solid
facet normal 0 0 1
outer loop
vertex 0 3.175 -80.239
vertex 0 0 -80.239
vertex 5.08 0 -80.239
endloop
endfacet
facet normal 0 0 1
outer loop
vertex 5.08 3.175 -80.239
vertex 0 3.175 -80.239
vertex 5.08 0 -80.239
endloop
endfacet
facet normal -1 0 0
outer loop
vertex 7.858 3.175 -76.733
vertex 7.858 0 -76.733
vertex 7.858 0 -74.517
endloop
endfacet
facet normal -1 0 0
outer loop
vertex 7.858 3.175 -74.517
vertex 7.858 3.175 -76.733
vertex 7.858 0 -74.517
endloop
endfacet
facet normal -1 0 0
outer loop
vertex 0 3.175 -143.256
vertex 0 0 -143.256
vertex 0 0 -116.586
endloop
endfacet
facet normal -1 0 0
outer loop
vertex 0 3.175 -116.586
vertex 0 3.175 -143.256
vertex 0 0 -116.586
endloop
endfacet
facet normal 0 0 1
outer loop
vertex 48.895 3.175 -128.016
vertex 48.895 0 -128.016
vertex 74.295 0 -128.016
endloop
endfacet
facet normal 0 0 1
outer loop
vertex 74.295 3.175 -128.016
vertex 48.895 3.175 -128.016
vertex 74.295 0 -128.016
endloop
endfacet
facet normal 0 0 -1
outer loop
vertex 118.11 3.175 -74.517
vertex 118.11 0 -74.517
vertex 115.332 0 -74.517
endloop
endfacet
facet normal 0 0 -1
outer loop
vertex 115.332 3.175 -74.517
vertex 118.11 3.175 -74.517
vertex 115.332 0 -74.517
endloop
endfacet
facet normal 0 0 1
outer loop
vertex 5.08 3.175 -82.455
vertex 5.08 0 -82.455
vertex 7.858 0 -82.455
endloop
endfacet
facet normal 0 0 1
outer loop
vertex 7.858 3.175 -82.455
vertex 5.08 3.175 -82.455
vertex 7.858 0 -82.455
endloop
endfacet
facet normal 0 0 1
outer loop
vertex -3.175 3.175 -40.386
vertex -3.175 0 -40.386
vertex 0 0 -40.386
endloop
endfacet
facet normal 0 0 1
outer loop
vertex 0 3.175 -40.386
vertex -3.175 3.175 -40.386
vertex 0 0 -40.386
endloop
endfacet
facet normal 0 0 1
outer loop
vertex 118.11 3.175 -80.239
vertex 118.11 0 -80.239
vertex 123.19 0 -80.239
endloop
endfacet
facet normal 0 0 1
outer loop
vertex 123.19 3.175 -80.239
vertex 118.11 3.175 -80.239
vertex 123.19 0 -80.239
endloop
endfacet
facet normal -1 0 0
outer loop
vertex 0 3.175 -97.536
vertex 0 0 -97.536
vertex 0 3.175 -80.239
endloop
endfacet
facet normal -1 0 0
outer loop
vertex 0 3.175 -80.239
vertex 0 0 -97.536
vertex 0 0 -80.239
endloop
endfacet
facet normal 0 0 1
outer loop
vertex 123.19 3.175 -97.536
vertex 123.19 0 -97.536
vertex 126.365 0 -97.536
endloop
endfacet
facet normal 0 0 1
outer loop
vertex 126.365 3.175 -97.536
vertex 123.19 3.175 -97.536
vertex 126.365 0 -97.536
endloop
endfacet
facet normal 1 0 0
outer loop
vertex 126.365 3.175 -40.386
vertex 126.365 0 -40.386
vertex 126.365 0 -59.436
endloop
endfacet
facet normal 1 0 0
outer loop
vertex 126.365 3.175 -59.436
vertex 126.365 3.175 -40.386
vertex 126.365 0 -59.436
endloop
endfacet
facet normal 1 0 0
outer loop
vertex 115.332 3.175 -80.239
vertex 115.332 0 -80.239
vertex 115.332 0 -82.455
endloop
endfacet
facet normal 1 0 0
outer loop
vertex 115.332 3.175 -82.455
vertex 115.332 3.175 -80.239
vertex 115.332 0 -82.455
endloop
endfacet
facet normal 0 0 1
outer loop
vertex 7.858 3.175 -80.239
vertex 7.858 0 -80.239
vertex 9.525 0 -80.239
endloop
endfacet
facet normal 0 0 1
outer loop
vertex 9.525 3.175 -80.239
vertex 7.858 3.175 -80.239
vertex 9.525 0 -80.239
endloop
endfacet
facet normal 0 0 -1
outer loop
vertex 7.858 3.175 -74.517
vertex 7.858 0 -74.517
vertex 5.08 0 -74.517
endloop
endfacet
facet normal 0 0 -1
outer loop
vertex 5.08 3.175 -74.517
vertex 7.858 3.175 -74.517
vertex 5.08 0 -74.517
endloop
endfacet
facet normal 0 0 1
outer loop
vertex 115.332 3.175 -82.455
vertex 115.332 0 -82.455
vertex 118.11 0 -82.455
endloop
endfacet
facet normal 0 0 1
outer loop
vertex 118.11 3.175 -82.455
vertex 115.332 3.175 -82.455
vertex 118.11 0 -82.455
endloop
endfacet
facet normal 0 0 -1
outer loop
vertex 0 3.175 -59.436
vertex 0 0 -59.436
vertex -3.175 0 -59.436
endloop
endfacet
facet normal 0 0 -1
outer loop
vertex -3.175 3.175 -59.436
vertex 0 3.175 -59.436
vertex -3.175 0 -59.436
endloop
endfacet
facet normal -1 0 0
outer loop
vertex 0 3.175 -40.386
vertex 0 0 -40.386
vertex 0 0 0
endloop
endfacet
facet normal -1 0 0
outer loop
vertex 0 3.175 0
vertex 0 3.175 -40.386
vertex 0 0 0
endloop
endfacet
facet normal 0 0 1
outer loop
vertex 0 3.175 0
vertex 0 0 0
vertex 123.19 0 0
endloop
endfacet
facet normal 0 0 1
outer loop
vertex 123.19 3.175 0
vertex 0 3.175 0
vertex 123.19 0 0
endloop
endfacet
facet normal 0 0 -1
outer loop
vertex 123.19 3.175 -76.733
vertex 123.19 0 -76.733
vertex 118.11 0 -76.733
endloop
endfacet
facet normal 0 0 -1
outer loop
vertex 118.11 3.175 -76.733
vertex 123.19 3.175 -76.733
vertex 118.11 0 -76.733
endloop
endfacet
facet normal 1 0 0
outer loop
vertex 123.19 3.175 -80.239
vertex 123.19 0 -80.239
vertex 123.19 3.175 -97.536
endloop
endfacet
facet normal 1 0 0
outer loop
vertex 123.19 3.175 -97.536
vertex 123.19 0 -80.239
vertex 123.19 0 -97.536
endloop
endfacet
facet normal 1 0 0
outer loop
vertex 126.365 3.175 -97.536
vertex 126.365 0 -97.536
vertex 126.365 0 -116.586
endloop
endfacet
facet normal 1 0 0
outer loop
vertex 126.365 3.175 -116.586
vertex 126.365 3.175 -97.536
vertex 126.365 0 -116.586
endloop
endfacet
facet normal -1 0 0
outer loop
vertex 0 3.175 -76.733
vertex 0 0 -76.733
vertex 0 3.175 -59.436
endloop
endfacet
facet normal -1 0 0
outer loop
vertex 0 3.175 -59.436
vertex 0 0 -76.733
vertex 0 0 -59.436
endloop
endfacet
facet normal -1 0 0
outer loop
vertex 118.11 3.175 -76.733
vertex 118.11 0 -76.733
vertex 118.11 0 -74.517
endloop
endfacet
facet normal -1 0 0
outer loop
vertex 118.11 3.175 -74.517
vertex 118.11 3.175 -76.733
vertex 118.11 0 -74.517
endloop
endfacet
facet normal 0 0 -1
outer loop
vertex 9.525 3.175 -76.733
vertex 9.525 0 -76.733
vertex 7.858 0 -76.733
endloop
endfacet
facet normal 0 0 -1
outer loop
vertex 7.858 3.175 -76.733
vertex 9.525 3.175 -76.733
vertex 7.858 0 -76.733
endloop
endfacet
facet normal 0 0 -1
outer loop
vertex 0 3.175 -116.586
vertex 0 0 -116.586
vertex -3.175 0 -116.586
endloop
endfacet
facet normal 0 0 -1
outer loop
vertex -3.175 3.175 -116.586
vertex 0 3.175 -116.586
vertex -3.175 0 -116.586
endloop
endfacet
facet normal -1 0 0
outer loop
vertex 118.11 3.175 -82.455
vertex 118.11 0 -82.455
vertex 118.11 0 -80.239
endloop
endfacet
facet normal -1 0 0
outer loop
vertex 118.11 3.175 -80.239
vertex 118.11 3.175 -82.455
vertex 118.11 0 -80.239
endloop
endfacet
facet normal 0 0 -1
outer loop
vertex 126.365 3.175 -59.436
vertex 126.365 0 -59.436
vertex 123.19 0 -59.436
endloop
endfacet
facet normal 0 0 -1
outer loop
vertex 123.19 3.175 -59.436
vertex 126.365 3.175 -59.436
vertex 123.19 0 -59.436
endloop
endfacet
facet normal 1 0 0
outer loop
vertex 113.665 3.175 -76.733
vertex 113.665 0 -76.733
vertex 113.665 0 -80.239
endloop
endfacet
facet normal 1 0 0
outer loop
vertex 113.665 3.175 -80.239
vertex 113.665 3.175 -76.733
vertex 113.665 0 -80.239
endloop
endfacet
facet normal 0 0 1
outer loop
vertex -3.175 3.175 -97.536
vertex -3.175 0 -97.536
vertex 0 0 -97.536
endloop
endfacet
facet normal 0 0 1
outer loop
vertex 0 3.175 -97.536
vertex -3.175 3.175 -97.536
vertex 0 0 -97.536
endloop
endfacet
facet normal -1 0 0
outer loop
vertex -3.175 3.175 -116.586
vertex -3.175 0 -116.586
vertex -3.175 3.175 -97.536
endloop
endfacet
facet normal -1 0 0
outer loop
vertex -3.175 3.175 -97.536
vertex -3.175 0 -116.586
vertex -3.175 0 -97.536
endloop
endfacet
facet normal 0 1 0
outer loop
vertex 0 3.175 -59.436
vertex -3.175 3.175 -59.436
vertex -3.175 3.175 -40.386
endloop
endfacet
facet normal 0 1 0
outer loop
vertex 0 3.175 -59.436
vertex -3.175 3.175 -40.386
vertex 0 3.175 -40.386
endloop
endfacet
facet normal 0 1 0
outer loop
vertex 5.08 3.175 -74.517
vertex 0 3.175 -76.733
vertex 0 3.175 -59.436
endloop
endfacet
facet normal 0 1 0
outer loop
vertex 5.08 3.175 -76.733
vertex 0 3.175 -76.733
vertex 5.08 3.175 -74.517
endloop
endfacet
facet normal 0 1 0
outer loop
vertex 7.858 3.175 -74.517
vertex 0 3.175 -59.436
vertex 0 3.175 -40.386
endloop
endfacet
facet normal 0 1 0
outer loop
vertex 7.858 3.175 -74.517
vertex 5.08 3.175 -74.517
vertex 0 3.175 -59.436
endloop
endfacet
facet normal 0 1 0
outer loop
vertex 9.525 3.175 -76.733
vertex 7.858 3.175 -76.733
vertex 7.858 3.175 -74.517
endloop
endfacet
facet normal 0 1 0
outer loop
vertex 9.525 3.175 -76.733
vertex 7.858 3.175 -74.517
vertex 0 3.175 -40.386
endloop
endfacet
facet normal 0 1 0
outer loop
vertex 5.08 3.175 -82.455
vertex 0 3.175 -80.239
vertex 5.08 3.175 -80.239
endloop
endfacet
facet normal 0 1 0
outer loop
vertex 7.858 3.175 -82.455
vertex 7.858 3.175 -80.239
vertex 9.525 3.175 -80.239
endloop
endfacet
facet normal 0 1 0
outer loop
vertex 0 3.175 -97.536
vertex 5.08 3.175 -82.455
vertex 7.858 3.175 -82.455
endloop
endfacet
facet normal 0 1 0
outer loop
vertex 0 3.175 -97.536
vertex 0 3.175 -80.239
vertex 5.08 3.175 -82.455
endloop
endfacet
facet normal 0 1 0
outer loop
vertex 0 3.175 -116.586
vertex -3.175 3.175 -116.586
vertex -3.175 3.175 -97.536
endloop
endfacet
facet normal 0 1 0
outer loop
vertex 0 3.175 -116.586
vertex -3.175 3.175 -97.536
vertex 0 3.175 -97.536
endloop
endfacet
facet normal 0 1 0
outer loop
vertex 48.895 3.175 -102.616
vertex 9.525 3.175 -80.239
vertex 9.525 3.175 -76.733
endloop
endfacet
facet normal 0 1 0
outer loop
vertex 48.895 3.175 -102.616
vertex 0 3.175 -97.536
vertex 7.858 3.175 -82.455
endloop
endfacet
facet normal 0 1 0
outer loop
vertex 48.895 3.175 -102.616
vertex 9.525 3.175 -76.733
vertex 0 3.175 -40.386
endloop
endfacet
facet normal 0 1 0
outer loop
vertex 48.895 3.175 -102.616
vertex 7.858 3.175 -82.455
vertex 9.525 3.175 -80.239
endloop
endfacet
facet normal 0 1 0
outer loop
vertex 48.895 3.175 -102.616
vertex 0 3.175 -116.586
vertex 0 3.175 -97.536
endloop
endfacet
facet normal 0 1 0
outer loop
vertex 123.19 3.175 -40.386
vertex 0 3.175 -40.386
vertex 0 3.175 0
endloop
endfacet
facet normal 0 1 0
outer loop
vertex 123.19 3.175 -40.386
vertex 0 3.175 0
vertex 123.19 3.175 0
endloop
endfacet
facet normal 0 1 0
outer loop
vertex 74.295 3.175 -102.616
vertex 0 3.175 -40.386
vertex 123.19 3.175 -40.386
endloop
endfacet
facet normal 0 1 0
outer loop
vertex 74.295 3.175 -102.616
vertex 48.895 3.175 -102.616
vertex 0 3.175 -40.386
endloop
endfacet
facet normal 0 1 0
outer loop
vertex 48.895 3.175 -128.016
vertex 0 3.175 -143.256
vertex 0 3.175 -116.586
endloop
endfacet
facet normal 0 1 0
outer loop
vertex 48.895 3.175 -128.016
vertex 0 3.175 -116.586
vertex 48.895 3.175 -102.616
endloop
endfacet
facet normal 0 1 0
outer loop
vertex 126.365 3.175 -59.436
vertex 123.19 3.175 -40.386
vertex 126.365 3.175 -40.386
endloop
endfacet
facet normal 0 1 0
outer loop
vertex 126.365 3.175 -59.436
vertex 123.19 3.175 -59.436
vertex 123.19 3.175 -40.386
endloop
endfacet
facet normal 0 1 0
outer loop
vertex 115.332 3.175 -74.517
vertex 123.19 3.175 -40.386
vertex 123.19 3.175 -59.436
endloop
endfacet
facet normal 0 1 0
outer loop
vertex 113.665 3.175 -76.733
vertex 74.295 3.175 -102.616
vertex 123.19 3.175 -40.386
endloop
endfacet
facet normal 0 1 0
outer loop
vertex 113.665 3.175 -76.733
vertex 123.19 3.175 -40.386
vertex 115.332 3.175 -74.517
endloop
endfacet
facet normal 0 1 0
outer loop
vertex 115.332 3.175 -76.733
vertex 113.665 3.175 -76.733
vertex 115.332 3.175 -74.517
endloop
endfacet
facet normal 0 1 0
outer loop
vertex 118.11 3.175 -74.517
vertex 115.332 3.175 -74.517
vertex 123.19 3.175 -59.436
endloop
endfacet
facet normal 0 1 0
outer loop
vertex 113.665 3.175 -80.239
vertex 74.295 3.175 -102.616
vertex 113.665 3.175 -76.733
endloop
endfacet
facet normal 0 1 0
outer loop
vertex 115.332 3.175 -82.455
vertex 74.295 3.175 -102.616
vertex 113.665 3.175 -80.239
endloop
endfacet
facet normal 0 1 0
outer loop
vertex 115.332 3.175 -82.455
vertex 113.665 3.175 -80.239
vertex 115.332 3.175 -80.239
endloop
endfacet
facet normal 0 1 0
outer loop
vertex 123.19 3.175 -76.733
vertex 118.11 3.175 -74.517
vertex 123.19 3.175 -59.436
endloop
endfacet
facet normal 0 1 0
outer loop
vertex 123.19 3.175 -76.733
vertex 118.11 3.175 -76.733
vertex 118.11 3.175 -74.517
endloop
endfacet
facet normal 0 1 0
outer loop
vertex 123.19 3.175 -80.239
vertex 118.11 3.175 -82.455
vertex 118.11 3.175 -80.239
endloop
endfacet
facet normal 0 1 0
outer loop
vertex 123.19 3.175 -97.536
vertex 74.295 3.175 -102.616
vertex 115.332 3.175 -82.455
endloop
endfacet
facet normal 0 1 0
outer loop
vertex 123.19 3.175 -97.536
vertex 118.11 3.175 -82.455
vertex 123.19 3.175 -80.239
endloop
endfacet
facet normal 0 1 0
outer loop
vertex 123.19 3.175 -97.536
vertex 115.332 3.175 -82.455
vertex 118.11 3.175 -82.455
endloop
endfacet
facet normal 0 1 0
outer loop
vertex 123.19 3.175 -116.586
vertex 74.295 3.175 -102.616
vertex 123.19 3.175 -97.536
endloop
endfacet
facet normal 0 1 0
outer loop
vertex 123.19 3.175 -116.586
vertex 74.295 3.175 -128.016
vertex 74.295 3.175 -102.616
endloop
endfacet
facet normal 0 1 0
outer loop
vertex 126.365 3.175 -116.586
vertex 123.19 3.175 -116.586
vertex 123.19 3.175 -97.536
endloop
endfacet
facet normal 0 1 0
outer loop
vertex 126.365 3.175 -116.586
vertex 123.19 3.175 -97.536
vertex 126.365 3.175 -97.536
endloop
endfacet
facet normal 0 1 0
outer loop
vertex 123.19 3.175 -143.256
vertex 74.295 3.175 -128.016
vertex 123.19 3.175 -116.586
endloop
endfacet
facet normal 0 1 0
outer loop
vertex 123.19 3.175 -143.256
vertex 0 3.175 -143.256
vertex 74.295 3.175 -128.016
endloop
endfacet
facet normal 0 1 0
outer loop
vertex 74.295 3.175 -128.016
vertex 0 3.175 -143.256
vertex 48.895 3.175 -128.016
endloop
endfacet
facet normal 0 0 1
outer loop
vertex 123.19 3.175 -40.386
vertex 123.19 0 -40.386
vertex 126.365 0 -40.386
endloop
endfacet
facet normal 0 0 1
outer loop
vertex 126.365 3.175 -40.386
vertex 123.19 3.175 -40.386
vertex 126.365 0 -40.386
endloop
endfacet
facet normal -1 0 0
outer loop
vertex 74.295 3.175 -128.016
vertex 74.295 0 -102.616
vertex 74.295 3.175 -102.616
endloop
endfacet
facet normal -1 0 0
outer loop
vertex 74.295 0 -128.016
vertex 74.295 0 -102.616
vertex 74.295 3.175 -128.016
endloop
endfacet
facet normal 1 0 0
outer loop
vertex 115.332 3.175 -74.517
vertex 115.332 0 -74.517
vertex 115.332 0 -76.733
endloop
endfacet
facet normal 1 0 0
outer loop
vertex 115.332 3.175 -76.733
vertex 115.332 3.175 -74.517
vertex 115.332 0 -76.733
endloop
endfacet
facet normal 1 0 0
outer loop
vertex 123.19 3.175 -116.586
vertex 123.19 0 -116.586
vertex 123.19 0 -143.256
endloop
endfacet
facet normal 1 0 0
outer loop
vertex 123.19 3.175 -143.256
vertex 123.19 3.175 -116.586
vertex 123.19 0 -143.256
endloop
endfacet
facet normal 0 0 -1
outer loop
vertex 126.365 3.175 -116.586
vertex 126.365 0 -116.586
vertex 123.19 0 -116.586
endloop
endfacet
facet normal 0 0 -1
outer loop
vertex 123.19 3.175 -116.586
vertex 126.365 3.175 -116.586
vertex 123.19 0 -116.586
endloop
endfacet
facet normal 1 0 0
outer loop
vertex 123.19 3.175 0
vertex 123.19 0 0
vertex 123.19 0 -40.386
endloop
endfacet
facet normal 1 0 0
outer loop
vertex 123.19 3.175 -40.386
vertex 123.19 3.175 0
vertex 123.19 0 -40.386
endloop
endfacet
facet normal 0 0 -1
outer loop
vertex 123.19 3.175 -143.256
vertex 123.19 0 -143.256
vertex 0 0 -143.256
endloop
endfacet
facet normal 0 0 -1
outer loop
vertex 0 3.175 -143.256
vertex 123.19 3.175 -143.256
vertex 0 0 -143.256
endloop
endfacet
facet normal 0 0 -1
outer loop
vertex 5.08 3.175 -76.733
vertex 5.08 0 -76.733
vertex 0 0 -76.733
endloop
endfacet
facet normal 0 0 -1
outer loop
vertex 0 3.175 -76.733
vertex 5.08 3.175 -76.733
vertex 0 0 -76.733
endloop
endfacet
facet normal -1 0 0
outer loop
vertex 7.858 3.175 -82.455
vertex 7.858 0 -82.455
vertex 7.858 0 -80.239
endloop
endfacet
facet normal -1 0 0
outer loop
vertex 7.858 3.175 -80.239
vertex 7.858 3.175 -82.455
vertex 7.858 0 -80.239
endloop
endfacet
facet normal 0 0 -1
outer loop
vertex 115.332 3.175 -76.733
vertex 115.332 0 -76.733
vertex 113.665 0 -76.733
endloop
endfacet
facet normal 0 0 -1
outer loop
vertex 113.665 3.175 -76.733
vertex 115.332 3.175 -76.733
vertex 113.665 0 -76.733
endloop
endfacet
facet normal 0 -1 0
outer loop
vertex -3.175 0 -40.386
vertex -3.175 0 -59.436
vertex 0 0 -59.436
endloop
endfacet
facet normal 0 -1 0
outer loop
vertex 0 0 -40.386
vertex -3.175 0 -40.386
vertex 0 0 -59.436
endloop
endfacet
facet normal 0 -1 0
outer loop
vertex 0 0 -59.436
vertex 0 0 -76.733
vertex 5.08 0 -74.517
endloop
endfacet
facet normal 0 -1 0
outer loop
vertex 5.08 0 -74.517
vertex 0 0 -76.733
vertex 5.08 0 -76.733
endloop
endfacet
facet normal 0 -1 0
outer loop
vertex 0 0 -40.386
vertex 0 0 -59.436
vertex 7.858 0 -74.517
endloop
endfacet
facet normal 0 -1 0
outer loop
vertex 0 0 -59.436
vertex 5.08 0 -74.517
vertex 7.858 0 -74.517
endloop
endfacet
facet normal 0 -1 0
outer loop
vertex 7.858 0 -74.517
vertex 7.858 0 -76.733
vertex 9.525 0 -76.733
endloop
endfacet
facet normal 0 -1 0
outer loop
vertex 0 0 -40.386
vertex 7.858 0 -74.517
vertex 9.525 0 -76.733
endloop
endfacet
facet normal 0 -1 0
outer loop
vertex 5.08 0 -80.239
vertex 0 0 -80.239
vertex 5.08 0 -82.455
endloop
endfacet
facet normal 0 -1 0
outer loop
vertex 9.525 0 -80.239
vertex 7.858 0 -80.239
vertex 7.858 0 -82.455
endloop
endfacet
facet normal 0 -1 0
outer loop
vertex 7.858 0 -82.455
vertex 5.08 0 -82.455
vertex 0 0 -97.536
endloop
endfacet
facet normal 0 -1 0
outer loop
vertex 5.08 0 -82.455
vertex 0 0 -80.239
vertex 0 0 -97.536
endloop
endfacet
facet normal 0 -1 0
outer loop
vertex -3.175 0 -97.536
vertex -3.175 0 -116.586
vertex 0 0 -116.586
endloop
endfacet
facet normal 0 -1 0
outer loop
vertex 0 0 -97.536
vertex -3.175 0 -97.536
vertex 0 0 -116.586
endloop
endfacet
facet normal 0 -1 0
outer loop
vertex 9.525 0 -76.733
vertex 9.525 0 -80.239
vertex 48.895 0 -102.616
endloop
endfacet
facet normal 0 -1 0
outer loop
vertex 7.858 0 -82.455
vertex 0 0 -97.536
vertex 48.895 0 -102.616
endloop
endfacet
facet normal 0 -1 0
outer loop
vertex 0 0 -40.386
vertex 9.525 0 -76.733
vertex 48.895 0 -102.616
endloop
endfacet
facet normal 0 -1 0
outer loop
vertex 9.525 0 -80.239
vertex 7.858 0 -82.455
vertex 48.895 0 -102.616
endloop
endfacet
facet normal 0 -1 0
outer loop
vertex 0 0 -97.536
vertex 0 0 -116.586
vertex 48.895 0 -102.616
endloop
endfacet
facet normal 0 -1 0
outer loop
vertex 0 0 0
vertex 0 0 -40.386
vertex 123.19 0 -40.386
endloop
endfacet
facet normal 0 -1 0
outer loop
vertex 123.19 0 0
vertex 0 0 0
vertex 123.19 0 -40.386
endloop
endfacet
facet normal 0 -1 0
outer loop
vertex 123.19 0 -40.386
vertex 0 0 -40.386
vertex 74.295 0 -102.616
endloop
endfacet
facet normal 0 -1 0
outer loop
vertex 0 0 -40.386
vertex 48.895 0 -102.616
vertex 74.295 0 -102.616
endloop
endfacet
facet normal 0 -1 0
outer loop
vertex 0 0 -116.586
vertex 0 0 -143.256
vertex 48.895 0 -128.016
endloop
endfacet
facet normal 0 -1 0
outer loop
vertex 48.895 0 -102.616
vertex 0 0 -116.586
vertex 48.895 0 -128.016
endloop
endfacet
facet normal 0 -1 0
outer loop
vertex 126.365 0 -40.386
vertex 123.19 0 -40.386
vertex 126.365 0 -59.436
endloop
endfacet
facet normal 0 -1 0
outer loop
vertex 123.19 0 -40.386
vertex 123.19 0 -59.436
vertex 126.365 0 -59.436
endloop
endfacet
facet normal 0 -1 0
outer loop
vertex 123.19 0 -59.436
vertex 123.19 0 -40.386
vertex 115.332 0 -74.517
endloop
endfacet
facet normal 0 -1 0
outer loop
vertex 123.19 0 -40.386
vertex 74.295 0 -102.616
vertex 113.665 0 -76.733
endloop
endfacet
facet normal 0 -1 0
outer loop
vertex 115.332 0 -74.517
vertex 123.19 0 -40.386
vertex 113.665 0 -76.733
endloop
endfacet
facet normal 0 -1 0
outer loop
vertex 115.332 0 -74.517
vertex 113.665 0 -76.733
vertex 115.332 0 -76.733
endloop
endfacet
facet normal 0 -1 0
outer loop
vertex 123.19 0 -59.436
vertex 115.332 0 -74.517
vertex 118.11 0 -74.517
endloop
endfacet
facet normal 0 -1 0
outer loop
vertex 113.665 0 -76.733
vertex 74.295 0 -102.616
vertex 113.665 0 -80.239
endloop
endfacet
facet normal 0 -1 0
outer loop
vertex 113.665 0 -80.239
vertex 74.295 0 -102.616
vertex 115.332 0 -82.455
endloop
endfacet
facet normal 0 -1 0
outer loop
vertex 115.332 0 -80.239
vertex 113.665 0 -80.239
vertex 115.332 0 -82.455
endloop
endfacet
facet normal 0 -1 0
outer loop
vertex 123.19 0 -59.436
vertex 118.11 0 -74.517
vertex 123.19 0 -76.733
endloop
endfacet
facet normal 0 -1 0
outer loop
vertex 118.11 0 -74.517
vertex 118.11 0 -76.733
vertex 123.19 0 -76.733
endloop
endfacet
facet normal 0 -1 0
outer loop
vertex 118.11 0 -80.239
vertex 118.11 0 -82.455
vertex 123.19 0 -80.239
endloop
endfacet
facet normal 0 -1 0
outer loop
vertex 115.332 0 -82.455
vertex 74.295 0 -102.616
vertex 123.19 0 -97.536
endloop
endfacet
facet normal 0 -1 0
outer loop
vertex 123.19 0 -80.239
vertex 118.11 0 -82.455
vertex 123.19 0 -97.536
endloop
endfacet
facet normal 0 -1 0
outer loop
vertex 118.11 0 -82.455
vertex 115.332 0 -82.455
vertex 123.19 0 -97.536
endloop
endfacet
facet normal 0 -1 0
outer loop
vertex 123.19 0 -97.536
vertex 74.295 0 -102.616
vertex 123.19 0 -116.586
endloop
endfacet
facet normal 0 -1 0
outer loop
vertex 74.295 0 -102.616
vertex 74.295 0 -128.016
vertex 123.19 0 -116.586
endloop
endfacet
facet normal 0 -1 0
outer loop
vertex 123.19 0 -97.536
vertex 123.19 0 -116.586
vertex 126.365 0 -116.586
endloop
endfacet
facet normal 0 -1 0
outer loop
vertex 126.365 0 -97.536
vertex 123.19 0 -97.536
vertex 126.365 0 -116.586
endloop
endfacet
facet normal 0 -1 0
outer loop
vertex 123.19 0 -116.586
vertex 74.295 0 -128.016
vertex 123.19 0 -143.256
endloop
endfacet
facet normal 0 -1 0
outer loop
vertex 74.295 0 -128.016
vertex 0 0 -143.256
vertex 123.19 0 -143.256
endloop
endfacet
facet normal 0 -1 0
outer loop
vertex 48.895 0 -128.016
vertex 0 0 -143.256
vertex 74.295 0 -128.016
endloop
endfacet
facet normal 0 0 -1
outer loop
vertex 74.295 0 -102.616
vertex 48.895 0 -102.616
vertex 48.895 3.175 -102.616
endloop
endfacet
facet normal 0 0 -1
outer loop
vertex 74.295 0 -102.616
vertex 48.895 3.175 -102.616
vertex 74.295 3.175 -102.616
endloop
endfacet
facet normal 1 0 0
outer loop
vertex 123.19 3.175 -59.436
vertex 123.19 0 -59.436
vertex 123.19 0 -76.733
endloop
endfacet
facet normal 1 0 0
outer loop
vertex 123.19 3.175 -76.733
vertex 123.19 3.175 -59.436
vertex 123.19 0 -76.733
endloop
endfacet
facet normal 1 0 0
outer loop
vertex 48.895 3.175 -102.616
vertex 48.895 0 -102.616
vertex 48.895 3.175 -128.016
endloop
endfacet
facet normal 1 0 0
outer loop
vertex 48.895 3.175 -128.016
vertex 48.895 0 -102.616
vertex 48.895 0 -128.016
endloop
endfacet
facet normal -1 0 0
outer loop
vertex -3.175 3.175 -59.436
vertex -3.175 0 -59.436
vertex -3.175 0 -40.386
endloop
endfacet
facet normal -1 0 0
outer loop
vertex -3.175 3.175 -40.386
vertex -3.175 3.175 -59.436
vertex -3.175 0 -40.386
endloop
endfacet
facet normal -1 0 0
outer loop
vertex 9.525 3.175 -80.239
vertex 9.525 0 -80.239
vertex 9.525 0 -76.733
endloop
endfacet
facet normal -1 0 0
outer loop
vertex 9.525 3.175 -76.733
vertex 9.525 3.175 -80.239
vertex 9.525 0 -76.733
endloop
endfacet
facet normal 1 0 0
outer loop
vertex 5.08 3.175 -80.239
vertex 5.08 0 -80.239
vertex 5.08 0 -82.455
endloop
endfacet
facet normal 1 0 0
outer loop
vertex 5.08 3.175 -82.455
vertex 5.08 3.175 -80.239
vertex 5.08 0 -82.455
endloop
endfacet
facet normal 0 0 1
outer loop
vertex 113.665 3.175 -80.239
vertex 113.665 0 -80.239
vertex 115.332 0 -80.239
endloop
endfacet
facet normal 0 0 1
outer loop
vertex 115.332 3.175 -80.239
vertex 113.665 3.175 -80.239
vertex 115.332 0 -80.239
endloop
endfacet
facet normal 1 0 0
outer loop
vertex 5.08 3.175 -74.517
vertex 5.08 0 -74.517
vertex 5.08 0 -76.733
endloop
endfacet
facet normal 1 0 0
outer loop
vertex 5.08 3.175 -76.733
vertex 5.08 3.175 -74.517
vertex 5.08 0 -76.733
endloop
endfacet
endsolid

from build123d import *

# Parameters (mm, degrees)
SKETCH1_W           = 25.4
SKETCH1_H           = 25.4
BOSS_EXTRUDE1_DEPTH = 3.175


with BuildPart() as part:
    # Sketch1 → Boss-Extrude1 (new body)
    with BuildSketch(Plane(origin=(0, 0, 0), x_dir=(1, 0, 0), z_dir=(0, 1, 0))):
        Polygon((123.19, 116.586), (123.19, 143.256), (0, 143.256), (0, 116.586), (-3.175, 116.586), (-3.175, 97.536), (0, 97.536), (0, 80.2386), (5.08, 80.2386), (5.08, 82.45475), (7.858125, 82.45475), (7.858125, 80.2386), (9.525, 80.2386), (9.525, 76.7334), (7.858125, 76.7334), (7.858125, 74.51725), (5.08, 74.51725), (5.08, 76.7334), (0, 76.7334), (0, 59.436), (-3.175, 59.436), (-3.175, 40.386), (0, 40.386), (0, 0), (123.19, 0), (123.19, 40.386), (126.365, 40.386), (126.365, 59.436), (123.19, 59.436), (123.19, 76.7334), (118.11, 76.7334), (118.11, 74.51725), (115.331875, 74.51725), (115.331875, 76.7334), (113.665, 76.7334), (113.665, 80.2386), (115.331875, 80.2386), (115.331875, 82.45475), (118.11, 82.45475), (118.11, 80.2386), (123.19, 80.2386), (123.19, 97.536), (126.365, 97.536), (126.365, 116.586), align=None)
        with Locations((61.595, 115.316)):
            Rectangle(SKETCH1_W, SKETCH1_H, mode=Mode.SUBTRACT)
    extrude(amount=BOSS_EXTRUDE1_DEPTH)


solid = part.part
